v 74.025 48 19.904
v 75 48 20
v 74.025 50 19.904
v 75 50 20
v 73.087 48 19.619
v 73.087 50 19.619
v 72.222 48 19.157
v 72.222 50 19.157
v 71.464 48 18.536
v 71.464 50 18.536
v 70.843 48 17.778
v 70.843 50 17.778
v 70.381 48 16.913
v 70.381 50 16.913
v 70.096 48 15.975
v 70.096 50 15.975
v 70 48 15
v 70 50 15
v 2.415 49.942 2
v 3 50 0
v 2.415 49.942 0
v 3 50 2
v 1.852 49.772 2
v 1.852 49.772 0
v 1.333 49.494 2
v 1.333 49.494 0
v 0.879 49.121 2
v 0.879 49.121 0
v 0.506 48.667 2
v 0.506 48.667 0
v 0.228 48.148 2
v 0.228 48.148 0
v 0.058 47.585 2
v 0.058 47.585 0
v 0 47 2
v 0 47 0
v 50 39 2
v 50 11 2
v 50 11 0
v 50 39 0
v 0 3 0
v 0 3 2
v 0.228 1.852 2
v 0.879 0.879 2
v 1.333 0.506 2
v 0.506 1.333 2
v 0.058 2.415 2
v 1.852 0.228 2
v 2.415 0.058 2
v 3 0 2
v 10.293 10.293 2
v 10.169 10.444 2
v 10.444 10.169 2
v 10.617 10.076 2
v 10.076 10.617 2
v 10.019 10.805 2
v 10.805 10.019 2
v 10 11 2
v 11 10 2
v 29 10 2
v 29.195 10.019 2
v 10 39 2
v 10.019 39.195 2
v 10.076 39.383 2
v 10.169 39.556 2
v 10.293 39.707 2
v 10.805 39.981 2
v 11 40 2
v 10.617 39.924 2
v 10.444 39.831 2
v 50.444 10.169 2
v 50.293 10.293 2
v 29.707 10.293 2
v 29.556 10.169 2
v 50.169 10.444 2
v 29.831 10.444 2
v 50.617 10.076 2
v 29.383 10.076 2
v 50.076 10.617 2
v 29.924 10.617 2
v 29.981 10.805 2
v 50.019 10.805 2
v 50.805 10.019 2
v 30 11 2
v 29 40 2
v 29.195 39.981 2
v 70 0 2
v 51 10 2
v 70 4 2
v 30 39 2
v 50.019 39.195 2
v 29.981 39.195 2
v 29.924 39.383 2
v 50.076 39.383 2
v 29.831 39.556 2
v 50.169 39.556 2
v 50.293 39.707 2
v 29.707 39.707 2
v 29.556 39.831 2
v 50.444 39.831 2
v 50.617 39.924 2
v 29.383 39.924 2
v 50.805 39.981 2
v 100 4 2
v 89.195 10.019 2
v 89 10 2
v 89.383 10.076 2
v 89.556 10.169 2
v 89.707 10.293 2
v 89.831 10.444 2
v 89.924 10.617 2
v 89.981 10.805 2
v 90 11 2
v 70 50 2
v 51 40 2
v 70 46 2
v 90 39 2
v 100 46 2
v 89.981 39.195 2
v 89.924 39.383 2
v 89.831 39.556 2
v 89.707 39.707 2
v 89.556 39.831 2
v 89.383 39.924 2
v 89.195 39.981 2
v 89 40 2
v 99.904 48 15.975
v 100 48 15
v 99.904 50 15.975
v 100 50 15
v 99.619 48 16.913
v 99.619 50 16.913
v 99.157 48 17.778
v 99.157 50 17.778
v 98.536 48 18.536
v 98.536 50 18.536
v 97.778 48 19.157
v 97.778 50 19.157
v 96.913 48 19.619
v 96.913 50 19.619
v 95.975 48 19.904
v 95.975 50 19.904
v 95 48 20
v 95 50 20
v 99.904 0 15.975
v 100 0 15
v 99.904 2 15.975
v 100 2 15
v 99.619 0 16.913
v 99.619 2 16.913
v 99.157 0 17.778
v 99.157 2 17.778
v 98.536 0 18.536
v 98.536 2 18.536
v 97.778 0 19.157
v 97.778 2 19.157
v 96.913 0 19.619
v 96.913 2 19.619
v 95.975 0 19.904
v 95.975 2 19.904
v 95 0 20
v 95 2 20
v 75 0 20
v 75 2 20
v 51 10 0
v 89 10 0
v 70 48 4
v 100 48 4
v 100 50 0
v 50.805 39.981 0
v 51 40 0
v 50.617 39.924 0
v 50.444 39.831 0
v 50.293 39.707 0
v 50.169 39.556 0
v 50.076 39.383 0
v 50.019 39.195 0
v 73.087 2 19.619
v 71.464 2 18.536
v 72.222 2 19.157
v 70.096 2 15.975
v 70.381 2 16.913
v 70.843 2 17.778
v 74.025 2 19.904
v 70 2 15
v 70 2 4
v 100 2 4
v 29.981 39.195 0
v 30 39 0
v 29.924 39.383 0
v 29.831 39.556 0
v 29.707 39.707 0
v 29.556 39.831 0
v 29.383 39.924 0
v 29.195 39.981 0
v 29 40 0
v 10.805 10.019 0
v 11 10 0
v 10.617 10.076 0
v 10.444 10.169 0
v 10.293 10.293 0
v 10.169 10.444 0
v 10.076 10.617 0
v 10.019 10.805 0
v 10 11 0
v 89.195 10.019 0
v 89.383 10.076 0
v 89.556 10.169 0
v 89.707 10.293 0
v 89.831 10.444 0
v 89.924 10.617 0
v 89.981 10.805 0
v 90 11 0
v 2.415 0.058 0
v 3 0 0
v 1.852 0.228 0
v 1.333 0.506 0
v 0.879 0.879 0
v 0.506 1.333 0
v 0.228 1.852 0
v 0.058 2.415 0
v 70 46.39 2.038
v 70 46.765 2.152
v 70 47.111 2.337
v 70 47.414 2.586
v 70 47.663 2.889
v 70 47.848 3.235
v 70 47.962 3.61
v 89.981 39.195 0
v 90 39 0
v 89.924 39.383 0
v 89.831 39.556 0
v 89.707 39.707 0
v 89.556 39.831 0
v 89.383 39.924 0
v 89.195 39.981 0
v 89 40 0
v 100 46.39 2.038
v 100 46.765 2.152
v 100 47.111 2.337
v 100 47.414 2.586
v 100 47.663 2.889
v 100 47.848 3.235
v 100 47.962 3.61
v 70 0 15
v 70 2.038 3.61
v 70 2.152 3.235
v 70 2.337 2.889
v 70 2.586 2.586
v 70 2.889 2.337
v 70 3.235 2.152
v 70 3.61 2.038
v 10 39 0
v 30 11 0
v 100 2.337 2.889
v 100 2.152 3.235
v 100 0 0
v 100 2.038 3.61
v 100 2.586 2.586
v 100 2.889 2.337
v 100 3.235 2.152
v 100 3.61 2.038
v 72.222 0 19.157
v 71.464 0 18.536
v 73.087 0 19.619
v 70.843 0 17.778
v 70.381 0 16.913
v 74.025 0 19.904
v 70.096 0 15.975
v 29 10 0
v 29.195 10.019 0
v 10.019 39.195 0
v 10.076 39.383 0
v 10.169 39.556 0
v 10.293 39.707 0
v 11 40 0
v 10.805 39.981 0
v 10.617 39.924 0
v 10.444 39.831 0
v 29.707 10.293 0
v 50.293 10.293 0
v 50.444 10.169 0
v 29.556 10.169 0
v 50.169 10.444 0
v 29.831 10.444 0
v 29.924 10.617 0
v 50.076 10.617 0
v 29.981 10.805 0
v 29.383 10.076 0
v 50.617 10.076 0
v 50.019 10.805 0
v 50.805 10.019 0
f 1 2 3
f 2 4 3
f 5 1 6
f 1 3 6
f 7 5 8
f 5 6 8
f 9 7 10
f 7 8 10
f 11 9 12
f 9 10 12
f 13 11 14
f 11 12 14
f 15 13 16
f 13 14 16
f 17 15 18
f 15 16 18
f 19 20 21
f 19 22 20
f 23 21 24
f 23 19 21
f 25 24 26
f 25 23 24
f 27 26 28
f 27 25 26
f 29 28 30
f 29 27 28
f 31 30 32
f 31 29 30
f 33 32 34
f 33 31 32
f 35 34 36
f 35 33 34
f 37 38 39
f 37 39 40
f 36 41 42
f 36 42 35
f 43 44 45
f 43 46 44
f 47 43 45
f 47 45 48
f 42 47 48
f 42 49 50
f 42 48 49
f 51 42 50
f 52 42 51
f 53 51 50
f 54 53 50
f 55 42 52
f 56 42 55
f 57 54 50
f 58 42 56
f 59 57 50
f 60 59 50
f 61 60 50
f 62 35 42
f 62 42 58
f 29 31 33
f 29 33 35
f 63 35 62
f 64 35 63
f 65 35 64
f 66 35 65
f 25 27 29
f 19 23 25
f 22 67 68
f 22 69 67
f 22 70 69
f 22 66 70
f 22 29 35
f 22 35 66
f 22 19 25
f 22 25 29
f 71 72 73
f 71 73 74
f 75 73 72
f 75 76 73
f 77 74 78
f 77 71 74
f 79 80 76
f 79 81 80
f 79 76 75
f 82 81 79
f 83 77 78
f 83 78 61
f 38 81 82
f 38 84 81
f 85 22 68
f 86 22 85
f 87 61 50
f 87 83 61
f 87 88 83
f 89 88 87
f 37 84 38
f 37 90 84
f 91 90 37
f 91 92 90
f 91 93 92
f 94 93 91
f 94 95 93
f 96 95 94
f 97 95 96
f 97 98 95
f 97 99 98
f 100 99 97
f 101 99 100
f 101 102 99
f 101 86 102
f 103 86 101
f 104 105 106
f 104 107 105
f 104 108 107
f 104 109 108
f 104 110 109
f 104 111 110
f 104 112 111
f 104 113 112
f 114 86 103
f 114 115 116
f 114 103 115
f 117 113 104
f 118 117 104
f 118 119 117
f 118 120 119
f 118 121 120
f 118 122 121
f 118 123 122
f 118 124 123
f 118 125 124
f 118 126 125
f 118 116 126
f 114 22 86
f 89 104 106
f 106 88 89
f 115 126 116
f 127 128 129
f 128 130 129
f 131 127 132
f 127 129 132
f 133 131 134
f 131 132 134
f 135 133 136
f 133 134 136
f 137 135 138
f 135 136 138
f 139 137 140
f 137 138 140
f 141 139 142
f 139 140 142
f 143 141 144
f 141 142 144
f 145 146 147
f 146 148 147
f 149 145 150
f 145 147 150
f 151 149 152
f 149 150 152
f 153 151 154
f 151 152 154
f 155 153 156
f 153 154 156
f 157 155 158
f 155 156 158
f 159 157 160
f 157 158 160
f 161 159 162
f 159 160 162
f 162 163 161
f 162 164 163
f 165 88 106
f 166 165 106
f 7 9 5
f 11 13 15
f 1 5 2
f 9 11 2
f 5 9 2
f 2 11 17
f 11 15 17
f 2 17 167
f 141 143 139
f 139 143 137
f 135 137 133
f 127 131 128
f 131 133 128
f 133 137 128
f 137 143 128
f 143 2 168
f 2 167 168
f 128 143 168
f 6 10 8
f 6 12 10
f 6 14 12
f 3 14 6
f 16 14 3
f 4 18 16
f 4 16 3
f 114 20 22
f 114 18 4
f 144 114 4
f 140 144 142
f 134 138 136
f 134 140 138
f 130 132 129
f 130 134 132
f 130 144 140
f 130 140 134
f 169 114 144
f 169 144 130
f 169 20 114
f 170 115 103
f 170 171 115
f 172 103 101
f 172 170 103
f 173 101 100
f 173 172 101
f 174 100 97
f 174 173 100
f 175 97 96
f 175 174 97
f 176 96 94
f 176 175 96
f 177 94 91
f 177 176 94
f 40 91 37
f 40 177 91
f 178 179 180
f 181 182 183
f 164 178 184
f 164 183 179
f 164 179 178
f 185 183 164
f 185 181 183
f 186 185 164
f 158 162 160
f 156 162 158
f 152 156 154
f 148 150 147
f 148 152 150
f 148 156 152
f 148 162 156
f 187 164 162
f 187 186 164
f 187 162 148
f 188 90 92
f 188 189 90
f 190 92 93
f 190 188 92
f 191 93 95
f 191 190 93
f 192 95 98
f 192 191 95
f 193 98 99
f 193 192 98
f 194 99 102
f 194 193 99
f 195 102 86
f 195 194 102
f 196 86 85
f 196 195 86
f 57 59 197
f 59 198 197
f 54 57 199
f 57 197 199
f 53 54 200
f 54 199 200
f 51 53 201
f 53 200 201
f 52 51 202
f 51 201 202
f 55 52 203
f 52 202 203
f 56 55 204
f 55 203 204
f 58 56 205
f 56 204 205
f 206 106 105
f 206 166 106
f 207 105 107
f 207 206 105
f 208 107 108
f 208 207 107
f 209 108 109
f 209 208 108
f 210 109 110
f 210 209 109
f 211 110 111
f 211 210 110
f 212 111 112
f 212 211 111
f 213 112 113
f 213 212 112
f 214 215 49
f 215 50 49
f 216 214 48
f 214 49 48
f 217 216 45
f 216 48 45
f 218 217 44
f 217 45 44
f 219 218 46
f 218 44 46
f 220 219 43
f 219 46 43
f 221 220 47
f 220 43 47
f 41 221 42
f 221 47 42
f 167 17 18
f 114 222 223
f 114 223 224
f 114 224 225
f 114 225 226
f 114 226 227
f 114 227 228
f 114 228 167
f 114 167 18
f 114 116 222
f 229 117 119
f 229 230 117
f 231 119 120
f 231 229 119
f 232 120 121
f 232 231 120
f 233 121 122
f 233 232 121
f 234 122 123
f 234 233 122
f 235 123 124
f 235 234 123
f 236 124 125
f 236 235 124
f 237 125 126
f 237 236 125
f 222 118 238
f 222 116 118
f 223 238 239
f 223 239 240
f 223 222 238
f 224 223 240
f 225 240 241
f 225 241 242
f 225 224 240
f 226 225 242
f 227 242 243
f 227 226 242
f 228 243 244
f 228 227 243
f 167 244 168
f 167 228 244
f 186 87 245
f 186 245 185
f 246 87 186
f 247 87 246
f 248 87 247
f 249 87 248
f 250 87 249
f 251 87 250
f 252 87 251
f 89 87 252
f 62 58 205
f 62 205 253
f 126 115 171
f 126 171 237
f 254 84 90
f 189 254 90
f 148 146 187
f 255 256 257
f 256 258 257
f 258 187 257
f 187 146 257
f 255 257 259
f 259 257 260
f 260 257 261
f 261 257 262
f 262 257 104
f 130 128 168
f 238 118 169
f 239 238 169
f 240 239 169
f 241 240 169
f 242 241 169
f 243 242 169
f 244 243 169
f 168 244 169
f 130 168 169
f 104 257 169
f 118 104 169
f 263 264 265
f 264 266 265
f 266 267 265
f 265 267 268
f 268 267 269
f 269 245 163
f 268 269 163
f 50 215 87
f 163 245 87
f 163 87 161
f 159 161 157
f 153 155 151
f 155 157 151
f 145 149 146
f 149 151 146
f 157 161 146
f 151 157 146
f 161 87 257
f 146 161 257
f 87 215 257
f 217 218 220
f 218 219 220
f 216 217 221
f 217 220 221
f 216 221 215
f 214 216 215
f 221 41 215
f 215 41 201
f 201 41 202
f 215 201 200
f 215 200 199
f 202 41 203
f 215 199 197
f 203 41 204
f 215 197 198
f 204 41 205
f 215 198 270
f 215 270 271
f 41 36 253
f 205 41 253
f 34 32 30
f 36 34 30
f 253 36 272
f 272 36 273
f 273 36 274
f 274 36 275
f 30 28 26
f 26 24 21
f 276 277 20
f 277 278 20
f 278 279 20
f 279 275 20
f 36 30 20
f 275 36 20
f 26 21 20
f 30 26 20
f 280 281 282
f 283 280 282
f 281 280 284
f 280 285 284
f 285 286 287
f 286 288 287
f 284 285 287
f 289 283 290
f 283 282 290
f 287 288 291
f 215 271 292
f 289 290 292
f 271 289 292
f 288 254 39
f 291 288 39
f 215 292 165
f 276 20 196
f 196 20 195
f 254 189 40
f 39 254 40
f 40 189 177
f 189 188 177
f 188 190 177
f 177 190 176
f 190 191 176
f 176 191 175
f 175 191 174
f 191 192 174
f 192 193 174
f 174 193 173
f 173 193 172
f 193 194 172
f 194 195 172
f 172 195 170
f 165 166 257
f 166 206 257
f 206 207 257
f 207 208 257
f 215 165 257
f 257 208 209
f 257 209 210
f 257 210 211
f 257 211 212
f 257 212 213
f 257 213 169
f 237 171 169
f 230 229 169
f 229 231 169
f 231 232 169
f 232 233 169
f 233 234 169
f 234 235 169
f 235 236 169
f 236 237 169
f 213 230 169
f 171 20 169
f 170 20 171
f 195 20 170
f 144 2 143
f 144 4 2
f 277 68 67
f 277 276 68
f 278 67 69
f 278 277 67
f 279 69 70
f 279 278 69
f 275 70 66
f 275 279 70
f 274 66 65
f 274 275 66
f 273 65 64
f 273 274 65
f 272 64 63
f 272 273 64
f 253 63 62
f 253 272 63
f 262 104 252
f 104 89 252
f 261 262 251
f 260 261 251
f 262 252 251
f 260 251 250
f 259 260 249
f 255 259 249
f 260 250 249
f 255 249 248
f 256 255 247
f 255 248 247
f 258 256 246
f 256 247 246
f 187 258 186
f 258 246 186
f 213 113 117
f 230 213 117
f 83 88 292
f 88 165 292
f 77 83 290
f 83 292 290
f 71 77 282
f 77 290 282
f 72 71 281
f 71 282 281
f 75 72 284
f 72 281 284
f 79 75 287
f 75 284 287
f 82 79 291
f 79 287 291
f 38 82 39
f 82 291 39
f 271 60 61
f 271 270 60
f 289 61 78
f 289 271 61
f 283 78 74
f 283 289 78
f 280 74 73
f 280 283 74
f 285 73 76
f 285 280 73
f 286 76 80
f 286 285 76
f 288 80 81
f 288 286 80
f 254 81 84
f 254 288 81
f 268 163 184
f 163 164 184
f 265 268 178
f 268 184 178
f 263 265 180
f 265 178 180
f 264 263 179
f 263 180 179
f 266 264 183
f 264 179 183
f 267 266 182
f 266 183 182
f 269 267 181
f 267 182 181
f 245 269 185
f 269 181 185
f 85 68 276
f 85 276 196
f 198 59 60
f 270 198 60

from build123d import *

# Parameters (mm, degrees)
BOX001_W     = 30
BOX001_H     = 2
BOX001_DEPTH = 20
BOX002_W     = 30
BOX002_H     = 2
BOX002_DEPTH = 20
BOX_W        = 100
BOX_H        = 50
BOX_DEPTH    = 2
SKETCH_W     = 20
SKETCH_H     = 30
SKETCH_W_2   = 40
POCKET_DEPTH = 2.001
FILLET_1_R   = 3
FILLET_2_R   = 1
FILLET001_R  = 5
FILLET002_R  = 2


with BuildPart() as aleta_dch:
    # Box001 → Box001 (new body)
    with BuildSketch(Plane(origin=(70, 0, 0), x_dir=(1, 0, 0), z_dir=(0, 0, 1))):
        with Locations((15, 1)):
            Rectangle(BOX001_W, BOX001_H)
    extrude(amount=BOX001_DEPTH)


with BuildPart() as aleta_izq:
    # Box002 → Box002 (new body)
    with BuildSketch(Plane(origin=(70, 48, 0), x_dir=(1, 0, 0), z_dir=(0, 0, 1))):
        with Locations((15, 1)):
            Rectangle(BOX002_W, BOX002_H)
    extrude(amount=BOX002_DEPTH)


with BuildPart() as refuerzos:
    # Box → Box (new body)
    with BuildSketch(Plane.XY):
        with Locations((50, 25)):
            Rectangle(BOX_W, BOX_H)
    extrude(amount=BOX_DEPTH)

    # Fusion: union Aleta_DCH, Aleta_IZQ
    add(aleta_dch.part)
    add(aleta_izq.part)

    # Sketch → Pocket (cut, through all)
    with BuildSketch(Plane.XY.offset(2)):
        with Locations((20, 25)):
            Rectangle(SKETCH_W, SKETCH_H)
        with Locations((70, 25)):
            Rectangle(SKETCH_W_2, SKETCH_H)
    extrude(amount=-POCKET_DEPTH, mode=Mode.SUBTRACT)

    # Fillet 1
    fillet_1_edges = [refuerzos.edges().sort_by_distance(p)[0] for p in [
        (0, 50, 1),
        (0, 0, 1),
    ]]
    fillet(fillet_1_edges, radius=FILLET_1_R)

    # Fillet 2
    fillet_2_edges = [refuerzos.edges().sort_by_distance(p)[0] for p in [
        (90, 10, 1),
        (50, 10, 1),
        (90, 40, 1),
        (50, 40, 1),
        (10, 40, 1),
        (30, 40, 1),
        (10, 10, 1),
        (30, 10, 1),
    ]]
    fillet(fillet_2_edges, radius=FILLET_2_R)

    # Fillet001
    fillet001_edges = [refuerzos.edges().sort_by_distance(p)[0] for p in [
        (100, 1, 20),
        (100, 49, 20),
        (70, 49, 20),
        (70, 1, 20),
    ]]
    fillet(fillet001_edges, radius=FILLET001_R)

    # Fillet002
    fillet002_edges = [refuerzos.edges().sort_by_distance(p)[0] for p in [
        (85, 48, 2),
        (85, 2, 2),
    ]]
    fillet(fillet002_edges, radius=FILLET002_R)


solid = refuerzos.part
